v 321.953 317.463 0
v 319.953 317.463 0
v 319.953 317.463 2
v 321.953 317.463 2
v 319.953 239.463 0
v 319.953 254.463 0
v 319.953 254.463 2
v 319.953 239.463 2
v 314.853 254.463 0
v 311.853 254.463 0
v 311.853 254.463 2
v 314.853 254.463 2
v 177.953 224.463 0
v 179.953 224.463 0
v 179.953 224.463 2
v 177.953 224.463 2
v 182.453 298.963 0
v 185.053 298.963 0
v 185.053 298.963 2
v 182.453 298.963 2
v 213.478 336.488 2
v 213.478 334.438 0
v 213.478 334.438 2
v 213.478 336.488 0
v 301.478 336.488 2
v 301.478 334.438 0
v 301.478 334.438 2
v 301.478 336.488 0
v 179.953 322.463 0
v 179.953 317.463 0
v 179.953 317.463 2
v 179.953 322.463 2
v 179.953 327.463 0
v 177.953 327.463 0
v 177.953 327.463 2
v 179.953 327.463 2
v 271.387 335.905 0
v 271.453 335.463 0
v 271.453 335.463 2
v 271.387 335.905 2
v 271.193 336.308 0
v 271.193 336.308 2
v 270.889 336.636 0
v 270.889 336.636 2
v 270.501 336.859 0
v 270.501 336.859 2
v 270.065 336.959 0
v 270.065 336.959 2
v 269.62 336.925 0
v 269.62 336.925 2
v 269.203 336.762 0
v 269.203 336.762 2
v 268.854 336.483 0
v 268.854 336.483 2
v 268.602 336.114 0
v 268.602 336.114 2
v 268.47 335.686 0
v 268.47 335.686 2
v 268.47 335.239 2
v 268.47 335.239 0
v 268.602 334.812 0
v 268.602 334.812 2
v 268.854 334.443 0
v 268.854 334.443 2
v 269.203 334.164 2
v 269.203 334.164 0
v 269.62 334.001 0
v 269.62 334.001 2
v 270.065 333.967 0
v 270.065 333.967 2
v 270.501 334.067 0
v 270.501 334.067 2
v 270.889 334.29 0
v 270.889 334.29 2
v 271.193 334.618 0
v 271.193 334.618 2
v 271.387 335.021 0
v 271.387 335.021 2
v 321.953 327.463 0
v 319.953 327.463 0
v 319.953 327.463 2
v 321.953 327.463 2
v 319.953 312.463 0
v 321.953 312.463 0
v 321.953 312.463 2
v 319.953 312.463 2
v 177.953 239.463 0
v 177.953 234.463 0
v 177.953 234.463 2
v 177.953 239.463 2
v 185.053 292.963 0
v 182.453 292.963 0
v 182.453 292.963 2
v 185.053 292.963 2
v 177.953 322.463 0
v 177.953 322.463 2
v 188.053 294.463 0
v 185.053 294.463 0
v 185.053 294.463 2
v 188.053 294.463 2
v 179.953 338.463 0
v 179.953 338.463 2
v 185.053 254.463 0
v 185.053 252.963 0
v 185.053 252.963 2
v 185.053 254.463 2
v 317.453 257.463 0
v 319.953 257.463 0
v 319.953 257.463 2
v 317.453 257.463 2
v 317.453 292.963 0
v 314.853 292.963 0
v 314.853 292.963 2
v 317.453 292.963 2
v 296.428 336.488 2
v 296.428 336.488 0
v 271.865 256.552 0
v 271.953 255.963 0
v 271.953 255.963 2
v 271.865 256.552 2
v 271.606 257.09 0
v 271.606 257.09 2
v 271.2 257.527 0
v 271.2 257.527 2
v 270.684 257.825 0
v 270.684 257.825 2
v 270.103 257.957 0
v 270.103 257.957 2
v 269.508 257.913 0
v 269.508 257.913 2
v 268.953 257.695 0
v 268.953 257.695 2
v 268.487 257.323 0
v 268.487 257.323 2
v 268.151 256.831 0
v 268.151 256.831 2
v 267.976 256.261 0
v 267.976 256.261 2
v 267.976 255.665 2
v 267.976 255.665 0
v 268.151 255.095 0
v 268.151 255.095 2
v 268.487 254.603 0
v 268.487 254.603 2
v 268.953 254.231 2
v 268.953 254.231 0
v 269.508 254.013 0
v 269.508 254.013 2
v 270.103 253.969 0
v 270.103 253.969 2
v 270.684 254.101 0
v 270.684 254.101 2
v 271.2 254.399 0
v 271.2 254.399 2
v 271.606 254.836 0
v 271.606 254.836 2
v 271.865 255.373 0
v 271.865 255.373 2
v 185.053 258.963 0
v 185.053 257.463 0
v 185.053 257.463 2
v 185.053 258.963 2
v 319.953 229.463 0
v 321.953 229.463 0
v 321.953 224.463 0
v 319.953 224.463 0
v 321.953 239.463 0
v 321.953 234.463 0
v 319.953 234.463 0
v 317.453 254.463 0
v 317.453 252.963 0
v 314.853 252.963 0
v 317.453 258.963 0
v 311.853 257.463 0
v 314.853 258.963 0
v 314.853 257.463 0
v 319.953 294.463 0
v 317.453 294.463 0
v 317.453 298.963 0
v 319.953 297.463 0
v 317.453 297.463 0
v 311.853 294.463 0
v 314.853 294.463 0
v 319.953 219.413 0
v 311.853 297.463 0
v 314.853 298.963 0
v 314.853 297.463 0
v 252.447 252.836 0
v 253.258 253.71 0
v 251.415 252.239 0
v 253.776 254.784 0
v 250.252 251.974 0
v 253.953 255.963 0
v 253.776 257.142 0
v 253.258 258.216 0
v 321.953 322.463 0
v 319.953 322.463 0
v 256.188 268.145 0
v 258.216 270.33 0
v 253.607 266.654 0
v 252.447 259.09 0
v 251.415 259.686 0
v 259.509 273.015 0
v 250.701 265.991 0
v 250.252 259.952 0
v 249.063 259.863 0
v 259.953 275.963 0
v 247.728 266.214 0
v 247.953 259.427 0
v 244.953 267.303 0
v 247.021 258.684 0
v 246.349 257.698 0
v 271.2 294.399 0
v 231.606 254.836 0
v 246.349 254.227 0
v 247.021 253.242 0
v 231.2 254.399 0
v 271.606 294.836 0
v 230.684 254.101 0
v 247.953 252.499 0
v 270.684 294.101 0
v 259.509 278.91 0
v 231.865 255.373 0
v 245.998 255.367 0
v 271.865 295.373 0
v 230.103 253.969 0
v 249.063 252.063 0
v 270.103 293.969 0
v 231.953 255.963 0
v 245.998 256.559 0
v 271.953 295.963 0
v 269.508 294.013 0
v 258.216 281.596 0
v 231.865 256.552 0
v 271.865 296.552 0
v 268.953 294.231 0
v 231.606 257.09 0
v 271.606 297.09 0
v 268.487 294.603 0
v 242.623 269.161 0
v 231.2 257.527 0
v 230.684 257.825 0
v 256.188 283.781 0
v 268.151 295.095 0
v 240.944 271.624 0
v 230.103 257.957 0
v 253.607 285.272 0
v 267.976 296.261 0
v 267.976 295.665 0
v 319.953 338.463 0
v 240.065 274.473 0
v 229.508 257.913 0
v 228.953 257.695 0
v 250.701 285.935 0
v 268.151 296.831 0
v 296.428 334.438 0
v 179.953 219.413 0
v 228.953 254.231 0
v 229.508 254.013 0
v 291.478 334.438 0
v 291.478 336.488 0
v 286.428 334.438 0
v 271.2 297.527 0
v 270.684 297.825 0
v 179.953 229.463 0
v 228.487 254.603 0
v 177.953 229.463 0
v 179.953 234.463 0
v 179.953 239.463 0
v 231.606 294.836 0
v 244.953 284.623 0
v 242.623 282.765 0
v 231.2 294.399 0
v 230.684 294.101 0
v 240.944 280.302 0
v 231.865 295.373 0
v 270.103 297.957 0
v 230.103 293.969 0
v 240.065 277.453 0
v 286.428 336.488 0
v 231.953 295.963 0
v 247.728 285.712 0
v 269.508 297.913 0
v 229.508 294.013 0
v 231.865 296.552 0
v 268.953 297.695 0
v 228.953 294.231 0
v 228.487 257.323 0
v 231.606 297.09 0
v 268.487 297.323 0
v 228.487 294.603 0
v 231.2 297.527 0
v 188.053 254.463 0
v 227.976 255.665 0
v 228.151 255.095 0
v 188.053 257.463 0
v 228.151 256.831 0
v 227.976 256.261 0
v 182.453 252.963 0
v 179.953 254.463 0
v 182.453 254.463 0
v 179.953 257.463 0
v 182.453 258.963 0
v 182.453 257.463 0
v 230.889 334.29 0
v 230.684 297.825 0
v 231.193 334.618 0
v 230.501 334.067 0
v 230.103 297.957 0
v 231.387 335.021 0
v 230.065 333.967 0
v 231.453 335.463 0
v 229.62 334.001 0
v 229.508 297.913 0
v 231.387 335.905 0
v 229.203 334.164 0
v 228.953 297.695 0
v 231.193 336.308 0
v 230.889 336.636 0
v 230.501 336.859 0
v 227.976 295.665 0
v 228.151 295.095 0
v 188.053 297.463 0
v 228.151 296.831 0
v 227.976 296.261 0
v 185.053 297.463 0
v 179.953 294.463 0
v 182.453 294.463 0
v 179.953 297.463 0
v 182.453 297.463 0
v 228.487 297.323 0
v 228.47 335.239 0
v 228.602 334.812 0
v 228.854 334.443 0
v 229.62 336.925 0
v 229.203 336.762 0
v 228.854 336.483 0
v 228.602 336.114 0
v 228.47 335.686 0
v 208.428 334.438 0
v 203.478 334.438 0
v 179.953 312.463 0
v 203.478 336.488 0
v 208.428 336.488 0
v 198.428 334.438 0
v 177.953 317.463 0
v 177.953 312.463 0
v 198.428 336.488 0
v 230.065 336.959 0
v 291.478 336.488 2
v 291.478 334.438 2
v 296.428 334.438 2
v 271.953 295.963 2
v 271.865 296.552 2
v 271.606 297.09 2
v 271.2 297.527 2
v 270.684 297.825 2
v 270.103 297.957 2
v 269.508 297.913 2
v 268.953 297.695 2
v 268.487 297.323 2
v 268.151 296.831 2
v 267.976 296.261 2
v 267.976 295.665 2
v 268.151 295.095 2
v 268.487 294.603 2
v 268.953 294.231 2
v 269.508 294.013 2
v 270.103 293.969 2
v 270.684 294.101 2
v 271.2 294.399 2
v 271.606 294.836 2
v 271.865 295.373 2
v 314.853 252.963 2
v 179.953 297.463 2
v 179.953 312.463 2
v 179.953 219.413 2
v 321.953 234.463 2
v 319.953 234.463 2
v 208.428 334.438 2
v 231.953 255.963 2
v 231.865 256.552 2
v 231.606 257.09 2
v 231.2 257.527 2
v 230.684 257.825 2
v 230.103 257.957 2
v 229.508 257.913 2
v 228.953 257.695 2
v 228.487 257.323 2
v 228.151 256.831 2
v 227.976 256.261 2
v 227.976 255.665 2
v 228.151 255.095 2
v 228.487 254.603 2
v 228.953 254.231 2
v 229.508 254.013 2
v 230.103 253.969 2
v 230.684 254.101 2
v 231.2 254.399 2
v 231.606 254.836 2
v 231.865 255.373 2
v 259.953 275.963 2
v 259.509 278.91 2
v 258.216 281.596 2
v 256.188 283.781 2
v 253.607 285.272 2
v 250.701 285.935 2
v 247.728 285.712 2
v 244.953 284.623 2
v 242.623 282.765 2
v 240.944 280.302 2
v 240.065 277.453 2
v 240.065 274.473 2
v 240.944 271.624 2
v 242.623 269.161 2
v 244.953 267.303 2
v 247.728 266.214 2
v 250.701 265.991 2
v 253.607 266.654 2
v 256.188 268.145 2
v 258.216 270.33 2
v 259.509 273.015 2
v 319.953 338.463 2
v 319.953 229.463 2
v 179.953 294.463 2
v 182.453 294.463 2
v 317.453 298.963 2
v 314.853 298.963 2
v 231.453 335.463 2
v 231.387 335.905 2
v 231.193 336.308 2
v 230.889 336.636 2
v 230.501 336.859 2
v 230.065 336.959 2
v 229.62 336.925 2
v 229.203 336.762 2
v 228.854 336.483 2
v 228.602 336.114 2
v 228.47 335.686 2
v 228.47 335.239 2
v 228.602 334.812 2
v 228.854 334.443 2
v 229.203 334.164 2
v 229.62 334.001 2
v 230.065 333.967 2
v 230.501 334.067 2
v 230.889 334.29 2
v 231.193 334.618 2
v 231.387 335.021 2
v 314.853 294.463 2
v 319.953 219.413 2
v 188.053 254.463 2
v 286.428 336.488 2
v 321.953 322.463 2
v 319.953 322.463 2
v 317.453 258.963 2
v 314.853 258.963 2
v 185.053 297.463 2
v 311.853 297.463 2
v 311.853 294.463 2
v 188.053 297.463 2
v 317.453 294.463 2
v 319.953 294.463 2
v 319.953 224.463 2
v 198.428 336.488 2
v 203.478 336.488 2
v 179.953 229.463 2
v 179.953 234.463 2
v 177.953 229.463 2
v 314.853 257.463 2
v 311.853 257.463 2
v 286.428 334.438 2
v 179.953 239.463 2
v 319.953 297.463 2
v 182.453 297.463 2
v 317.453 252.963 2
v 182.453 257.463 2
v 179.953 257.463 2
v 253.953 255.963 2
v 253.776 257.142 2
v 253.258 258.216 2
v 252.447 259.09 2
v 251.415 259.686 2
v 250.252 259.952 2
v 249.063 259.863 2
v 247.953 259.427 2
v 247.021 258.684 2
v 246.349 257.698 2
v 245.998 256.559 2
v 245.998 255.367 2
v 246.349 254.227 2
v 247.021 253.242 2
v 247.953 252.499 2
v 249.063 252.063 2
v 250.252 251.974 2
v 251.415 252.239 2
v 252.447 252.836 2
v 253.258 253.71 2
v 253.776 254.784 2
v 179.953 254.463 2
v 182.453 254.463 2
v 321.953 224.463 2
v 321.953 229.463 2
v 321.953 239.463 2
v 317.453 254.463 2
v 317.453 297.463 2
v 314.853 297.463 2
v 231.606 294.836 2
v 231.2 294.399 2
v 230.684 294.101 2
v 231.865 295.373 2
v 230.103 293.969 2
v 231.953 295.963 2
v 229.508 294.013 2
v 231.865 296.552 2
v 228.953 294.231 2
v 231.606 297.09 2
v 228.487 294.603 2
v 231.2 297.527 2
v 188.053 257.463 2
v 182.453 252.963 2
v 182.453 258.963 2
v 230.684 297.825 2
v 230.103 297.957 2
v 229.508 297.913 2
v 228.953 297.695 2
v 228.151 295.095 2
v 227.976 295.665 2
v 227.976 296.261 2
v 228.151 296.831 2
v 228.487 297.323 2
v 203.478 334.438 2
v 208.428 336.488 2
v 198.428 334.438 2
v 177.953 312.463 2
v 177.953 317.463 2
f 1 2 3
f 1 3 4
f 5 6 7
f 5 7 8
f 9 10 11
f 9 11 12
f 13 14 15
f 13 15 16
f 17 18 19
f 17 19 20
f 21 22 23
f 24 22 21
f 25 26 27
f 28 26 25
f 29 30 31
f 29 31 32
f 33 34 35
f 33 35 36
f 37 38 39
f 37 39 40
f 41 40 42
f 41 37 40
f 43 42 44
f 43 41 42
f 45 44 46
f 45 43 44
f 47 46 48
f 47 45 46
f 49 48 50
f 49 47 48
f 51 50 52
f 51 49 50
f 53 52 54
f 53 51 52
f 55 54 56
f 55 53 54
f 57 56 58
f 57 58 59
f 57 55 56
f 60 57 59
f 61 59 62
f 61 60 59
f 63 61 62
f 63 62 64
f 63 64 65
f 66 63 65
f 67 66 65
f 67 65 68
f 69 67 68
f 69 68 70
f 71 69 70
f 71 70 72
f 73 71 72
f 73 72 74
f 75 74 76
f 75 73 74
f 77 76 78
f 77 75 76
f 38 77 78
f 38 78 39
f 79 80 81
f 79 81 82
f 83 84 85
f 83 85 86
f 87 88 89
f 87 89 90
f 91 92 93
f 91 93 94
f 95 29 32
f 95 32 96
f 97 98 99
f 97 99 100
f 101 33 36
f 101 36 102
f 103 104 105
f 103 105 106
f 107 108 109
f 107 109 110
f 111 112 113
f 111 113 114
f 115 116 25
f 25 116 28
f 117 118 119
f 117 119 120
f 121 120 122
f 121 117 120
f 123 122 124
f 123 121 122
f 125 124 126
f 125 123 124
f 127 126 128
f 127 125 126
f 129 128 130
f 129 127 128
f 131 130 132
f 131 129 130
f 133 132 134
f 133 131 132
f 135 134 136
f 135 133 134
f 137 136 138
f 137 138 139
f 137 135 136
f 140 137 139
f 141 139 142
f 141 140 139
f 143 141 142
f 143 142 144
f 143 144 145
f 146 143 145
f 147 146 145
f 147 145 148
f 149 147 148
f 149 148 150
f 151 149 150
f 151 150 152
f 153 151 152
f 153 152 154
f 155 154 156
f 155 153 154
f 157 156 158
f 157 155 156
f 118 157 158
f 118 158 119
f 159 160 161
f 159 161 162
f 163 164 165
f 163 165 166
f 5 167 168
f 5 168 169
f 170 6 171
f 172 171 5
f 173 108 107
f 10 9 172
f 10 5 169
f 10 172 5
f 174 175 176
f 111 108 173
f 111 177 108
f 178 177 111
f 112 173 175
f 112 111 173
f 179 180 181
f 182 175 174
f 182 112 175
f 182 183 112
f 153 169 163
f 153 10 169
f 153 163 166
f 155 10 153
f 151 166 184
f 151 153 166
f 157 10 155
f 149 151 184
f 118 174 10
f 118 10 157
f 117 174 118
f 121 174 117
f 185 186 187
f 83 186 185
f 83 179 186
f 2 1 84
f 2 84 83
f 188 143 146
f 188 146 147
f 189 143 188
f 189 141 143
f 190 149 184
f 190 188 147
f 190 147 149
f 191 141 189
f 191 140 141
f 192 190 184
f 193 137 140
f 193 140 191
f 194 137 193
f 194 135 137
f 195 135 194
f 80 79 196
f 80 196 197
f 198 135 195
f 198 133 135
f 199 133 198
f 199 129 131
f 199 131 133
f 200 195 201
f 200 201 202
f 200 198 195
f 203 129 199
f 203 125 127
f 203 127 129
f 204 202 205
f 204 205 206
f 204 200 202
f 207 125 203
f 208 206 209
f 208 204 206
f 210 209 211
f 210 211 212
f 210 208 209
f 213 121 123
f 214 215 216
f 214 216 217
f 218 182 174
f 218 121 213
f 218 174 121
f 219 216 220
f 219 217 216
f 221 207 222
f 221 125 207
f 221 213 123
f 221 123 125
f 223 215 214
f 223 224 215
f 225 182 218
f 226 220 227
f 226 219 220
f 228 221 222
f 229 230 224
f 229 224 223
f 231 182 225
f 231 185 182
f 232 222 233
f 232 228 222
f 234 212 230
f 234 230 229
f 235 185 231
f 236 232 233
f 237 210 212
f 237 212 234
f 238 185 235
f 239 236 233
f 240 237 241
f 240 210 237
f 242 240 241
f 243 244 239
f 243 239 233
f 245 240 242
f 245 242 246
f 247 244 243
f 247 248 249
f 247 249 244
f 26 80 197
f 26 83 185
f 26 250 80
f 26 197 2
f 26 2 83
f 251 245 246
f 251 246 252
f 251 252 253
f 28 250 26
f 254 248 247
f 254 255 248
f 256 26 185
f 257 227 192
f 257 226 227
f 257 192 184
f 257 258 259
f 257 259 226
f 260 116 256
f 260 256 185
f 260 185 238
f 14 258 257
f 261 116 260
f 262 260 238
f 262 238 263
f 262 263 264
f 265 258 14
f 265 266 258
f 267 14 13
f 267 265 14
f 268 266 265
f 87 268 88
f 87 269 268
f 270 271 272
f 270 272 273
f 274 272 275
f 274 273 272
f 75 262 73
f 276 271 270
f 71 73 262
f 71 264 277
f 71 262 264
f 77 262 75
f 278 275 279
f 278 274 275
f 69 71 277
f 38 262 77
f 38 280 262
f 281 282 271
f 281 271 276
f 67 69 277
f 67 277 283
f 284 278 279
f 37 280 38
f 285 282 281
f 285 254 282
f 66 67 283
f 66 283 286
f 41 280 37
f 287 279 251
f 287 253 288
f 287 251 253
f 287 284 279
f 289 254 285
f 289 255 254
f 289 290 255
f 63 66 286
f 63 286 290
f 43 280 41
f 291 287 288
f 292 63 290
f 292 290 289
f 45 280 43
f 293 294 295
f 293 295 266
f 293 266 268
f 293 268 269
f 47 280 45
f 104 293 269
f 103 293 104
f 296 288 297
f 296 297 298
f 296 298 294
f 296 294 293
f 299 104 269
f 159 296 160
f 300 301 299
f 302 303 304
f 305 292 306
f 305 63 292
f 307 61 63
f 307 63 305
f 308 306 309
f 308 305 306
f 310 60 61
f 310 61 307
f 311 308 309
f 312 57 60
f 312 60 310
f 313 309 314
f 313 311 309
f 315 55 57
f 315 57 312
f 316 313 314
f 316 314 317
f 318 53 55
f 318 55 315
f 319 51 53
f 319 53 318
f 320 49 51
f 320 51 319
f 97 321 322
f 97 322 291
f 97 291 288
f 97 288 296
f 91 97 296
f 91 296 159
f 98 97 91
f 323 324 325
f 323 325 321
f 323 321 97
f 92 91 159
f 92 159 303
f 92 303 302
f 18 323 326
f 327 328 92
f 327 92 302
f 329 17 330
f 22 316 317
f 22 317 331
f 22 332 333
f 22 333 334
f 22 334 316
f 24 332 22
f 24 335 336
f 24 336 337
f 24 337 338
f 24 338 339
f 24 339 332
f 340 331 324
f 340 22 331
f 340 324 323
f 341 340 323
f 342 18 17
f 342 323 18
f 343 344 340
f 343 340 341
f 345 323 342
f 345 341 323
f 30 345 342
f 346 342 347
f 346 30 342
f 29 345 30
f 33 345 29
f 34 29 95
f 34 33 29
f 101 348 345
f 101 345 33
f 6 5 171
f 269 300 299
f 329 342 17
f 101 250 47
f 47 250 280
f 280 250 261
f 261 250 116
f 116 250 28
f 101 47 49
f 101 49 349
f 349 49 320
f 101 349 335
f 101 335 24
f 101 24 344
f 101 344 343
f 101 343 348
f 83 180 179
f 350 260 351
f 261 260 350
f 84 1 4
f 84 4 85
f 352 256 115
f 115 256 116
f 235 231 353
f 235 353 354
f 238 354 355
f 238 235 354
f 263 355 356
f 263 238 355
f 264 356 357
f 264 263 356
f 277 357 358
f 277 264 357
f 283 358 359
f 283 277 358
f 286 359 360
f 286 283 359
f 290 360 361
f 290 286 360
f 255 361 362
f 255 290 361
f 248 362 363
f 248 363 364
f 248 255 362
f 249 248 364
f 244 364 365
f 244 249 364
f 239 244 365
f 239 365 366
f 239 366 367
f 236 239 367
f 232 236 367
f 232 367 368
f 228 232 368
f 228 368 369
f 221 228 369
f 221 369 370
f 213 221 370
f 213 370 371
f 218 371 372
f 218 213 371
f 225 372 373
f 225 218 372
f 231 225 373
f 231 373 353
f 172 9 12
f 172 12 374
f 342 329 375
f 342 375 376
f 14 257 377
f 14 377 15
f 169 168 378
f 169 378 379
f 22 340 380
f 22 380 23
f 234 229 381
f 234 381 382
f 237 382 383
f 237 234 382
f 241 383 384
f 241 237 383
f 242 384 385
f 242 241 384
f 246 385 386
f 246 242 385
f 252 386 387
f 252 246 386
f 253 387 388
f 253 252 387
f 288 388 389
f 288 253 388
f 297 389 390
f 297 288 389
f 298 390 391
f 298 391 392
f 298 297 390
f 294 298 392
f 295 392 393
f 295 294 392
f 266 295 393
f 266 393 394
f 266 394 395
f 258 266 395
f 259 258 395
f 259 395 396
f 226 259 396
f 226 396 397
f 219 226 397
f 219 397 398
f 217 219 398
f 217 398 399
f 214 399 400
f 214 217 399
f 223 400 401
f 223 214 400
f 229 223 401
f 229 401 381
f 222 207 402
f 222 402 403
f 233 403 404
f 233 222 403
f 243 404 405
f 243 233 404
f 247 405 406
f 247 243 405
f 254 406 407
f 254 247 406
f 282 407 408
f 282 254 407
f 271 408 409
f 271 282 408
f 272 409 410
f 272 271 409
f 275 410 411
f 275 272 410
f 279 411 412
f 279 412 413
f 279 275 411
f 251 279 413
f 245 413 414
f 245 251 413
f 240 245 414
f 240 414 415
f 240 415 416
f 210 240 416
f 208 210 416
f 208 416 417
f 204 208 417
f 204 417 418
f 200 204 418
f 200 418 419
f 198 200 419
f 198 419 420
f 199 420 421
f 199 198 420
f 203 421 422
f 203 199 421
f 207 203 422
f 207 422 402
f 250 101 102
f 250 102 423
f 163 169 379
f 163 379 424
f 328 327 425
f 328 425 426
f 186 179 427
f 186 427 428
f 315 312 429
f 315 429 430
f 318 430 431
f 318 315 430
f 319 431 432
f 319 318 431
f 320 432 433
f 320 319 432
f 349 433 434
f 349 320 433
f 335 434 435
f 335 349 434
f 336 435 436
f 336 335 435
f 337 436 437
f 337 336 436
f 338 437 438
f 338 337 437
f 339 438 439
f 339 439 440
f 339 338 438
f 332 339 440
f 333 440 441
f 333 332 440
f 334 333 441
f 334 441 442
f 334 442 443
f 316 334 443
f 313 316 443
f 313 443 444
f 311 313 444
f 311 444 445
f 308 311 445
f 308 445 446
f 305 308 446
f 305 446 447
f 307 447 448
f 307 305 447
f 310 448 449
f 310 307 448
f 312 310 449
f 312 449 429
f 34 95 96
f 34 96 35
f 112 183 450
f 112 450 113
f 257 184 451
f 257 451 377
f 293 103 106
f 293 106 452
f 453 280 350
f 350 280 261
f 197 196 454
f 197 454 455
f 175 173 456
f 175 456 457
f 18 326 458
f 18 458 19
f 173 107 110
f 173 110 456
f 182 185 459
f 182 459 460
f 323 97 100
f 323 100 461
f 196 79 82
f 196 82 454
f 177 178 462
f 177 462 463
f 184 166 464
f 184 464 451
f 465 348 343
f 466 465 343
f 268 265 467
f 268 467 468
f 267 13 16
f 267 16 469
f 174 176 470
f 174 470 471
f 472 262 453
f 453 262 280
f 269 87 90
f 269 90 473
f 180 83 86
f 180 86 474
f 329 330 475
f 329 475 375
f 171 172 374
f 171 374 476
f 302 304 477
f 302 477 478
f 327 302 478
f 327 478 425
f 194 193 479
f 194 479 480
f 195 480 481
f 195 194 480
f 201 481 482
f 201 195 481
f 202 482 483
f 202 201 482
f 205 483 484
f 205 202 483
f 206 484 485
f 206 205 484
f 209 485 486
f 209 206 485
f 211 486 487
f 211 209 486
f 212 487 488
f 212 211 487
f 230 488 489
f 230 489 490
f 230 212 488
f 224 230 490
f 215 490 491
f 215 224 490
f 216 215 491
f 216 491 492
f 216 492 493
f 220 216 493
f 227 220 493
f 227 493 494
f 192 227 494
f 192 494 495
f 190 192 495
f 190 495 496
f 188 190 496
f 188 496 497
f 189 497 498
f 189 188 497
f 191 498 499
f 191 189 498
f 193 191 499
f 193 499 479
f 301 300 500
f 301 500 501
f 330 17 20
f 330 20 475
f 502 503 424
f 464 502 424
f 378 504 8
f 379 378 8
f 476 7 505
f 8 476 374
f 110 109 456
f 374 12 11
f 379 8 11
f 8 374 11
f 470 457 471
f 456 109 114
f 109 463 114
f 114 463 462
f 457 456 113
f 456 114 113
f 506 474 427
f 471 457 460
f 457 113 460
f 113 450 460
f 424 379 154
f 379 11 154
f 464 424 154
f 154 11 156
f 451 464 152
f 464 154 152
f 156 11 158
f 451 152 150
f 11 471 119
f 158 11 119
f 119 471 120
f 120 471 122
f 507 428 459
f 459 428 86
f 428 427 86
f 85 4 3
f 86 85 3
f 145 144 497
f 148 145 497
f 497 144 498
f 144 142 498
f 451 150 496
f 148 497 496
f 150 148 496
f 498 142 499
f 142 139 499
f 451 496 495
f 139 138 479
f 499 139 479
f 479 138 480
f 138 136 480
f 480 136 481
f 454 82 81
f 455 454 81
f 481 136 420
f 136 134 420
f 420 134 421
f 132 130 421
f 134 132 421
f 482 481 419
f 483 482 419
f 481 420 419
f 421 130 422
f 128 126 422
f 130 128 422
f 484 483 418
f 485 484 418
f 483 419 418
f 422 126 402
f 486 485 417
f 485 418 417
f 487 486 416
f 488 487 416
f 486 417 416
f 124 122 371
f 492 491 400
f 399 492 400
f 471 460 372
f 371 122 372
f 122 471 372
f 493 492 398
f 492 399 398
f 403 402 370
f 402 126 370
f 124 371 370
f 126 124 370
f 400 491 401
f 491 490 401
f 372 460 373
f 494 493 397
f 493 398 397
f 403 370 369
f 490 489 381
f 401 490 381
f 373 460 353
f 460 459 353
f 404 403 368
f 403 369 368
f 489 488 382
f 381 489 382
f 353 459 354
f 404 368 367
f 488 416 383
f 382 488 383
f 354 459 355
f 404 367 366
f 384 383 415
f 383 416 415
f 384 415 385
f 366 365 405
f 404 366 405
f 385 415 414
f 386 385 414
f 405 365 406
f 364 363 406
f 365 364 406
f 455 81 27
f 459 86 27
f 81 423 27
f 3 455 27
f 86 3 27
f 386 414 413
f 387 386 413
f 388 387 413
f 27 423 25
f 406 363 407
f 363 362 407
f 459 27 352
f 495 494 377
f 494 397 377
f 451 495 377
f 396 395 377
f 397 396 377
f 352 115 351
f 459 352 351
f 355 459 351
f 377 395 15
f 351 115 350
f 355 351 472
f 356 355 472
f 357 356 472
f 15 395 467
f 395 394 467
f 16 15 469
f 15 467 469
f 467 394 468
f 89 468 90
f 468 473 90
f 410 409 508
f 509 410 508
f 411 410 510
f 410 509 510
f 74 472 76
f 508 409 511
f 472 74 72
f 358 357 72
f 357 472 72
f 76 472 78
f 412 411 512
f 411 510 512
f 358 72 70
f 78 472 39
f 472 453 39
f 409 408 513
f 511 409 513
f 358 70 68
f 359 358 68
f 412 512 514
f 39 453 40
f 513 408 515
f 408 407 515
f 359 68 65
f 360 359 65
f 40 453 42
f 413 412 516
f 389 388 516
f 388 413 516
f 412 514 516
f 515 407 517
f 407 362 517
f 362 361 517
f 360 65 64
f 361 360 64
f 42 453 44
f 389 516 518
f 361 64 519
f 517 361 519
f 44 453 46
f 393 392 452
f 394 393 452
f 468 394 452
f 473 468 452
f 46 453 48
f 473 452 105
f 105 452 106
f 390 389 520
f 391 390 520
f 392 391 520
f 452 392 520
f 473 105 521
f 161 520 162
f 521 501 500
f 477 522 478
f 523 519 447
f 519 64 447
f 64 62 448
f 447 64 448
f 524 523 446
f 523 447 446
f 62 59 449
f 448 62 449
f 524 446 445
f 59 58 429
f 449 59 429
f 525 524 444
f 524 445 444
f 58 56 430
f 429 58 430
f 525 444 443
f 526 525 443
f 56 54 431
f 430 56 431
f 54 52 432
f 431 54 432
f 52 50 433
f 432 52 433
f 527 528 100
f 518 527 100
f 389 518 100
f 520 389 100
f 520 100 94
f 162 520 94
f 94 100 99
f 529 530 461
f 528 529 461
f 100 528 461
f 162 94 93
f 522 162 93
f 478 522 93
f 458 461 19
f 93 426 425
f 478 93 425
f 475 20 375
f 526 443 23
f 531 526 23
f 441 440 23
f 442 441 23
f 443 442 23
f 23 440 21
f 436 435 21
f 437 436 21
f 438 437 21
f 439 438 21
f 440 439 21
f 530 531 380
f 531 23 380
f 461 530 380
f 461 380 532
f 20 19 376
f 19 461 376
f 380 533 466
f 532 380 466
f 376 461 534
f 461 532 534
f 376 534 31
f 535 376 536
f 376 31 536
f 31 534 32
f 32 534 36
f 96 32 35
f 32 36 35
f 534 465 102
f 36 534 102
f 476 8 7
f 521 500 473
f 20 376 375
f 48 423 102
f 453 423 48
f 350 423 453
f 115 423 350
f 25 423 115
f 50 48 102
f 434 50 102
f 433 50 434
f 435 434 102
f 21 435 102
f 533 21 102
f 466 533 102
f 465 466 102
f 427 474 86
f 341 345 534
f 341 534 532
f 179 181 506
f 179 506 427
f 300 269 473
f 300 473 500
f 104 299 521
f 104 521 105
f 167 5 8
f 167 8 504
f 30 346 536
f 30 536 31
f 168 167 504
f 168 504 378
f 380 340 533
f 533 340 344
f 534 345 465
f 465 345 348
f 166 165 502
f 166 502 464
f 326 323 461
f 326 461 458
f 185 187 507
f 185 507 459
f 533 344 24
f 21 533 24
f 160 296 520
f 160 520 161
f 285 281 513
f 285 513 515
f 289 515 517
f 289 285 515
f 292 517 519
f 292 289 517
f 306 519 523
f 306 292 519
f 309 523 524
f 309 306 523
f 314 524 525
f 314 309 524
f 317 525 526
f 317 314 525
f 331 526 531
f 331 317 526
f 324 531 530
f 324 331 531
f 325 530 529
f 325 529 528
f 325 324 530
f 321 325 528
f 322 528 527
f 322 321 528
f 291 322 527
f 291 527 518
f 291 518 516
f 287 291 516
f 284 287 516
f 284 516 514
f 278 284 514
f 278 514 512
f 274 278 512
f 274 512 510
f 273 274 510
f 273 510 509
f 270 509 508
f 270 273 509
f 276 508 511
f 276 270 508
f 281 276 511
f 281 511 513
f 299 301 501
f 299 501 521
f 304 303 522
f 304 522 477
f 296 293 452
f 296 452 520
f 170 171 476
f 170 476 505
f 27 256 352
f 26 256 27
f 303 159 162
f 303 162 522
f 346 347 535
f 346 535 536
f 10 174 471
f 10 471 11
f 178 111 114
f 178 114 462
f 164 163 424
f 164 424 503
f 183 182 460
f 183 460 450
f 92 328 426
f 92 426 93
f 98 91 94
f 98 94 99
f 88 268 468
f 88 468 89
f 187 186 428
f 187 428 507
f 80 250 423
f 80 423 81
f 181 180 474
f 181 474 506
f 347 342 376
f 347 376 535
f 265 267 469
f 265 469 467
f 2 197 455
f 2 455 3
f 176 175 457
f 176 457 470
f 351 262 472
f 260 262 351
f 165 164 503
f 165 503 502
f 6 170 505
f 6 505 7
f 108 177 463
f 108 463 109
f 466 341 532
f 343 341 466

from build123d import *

# Parameters (mm, degrees)
SKETCH_1_R      = 10
SKETCH_1_R_2    = 4
SKETCH_1_R_3    = 1.5
SKETCH_1_R_4    = 2
SKETCH_1_W      = 5.05
SKETCH_1_H      = 2.05
EXTRUDE_1_DEPTH = 2


with BuildPart() as part:
    # 草图1 → 凸台-拉伸1 (new body)
    with BuildSketch(Plane.XY):
        Polygon((317.453360513, 257.462931603), (317.453360513, 258.962931603), (314.853360513, 258.962931603), (314.853360513, 257.462931603), (311.853360513, 257.462931603), (311.853360513, 254.462931603), (314.853360513, 254.462931603), (314.853360513, 252.962931603), (317.453360513, 252.962931603), (317.453360513, 254.462931603), (319.953360513, 254.462931603), (319.953360513, 239.462931603), (321.953360513, 239.462931603), (321.953360513, 234.462931603), (319.953360513, 234.462931603), (319.953360513, 229.462931603), (321.953360513, 229.462931603), (321.953360513, 224.462931603), (319.953360513, 224.462931603), (319.953360513, 219.413055772), (179.953360513, 219.413055772), (179.953360513, 224.462931603), (177.953360513, 224.462931603), (177.953360513, 229.462931603), (179.953360513, 229.462931603), (179.953360513, 234.462931603), (177.953360513, 234.462931603), (177.953360513, 239.462931603), (179.953360513, 239.462931603), (179.953360513, 254.462931603), (182.453360513, 254.462931603), (182.453360513, 252.962931602), (185.053360513, 252.962931602), (185.053360513, 254.462931603), (188.053360513, 254.462931603), (188.053360513, 257.462931603), (185.053360513, 257.462931603), (185.053360513, 258.962931602), (182.453360513, 258.962931602), (182.453360513, 257.462931603), (179.953360513, 257.462931603), (179.953360513, 294.462931603), (182.453360513, 294.462931603), (182.453360513, 292.962931603), (185.053360513, 292.962931603), (185.053360513, 294.462931603), (188.053360513, 294.462931603), (188.053360513, 297.462931603), (185.053360513, 297.462931603), (185.053360513, 298.962931603), (182.453360513, 298.962931603), (182.453360513, 297.462931603), (179.953360513, 297.462931603), (179.953360513, 312.462931603), (177.953360513, 312.462931603), (177.953360513, 317.462931603), (179.953360513, 317.462931603), (179.953360513, 322.462931603), (177.953360513, 322.462931603), (177.953360513, 327.462931603), (179.953360513, 327.462931603), (179.953360513, 338.462931603), (319.953360513, 338.462931603), (319.953360513, 327.462931603), (321.953360513, 327.462931603), (321.953360513, 322.462931603), (319.953360513, 322.462931603), (319.953360513, 317.462931603), (321.953360513, 317.462931603), (321.953360513, 312.462931603), (319.953360513, 312.462931603), (319.953360513, 297.462931603), (317.453360513, 297.462931603), (317.453360513, 298.962931603), (314.853360513, 298.962931603), (314.853360513, 297.462931603), (311.853360513, 297.462931603), (311.853360513, 294.462931603), (314.853360513, 294.462931603), (314.853360513, 292.962931603), (317.453360513, 292.962931603), (317.453360513, 294.462931603), (319.953360513, 294.462931603), (319.953360513, 257.462931603), align=None)
        with Locations((249.953360513, 275.962931603)):
            Circle(SKETCH_1_R, mode=Mode.SUBTRACT)
        with Locations((249.953360513, 255.962931603)):
            Circle(SKETCH_1_R_2, mode=Mode.SUBTRACT)
        with Locations((229.953360513, 335.462931603)):
            Circle(SKETCH_1_R_3, mode=Mode.SUBTRACT)
        with Locations((269.953360513, 335.462931603)):
            Circle(SKETCH_1_R_3, mode=Mode.SUBTRACT)
        with Locations((229.953360513, 255.962931603)):
            Circle(SKETCH_1_R_4, mode=Mode.SUBTRACT)
        with Locations((229.953360513, 295.962931603)):
            Circle(SKETCH_1_R_4, mode=Mode.SUBTRACT)
        with Locations((269.953360513, 295.962931603)):
            Circle(SKETCH_1_R_4, mode=Mode.SUBTRACT)
        with Locations((269.953360513, 255.962931603)):
            Circle(SKETCH_1_R_4, mode=Mode.SUBTRACT)
        with Locations((288.953360513, 335.462931603)):
            Rectangle(SKETCH_1_W, SKETCH_1_H, mode=Mode.SUBTRACT)
        with Locations((298.953360513, 335.462931603)):
            Rectangle(SKETCH_1_W, SKETCH_1_H, mode=Mode.SUBTRACT)
        with Locations((200.953360513, 335.462931603)):
            Rectangle(SKETCH_1_W, SKETCH_1_H, mode=Mode.SUBTRACT)
        with Locations((210.953360513, 335.462931603)):
            Rectangle(SKETCH_1_W, SKETCH_1_H, mode=Mode.SUBTRACT)
    extrude(amount=EXTRUDE_1_DEPTH)


solid = part.part
